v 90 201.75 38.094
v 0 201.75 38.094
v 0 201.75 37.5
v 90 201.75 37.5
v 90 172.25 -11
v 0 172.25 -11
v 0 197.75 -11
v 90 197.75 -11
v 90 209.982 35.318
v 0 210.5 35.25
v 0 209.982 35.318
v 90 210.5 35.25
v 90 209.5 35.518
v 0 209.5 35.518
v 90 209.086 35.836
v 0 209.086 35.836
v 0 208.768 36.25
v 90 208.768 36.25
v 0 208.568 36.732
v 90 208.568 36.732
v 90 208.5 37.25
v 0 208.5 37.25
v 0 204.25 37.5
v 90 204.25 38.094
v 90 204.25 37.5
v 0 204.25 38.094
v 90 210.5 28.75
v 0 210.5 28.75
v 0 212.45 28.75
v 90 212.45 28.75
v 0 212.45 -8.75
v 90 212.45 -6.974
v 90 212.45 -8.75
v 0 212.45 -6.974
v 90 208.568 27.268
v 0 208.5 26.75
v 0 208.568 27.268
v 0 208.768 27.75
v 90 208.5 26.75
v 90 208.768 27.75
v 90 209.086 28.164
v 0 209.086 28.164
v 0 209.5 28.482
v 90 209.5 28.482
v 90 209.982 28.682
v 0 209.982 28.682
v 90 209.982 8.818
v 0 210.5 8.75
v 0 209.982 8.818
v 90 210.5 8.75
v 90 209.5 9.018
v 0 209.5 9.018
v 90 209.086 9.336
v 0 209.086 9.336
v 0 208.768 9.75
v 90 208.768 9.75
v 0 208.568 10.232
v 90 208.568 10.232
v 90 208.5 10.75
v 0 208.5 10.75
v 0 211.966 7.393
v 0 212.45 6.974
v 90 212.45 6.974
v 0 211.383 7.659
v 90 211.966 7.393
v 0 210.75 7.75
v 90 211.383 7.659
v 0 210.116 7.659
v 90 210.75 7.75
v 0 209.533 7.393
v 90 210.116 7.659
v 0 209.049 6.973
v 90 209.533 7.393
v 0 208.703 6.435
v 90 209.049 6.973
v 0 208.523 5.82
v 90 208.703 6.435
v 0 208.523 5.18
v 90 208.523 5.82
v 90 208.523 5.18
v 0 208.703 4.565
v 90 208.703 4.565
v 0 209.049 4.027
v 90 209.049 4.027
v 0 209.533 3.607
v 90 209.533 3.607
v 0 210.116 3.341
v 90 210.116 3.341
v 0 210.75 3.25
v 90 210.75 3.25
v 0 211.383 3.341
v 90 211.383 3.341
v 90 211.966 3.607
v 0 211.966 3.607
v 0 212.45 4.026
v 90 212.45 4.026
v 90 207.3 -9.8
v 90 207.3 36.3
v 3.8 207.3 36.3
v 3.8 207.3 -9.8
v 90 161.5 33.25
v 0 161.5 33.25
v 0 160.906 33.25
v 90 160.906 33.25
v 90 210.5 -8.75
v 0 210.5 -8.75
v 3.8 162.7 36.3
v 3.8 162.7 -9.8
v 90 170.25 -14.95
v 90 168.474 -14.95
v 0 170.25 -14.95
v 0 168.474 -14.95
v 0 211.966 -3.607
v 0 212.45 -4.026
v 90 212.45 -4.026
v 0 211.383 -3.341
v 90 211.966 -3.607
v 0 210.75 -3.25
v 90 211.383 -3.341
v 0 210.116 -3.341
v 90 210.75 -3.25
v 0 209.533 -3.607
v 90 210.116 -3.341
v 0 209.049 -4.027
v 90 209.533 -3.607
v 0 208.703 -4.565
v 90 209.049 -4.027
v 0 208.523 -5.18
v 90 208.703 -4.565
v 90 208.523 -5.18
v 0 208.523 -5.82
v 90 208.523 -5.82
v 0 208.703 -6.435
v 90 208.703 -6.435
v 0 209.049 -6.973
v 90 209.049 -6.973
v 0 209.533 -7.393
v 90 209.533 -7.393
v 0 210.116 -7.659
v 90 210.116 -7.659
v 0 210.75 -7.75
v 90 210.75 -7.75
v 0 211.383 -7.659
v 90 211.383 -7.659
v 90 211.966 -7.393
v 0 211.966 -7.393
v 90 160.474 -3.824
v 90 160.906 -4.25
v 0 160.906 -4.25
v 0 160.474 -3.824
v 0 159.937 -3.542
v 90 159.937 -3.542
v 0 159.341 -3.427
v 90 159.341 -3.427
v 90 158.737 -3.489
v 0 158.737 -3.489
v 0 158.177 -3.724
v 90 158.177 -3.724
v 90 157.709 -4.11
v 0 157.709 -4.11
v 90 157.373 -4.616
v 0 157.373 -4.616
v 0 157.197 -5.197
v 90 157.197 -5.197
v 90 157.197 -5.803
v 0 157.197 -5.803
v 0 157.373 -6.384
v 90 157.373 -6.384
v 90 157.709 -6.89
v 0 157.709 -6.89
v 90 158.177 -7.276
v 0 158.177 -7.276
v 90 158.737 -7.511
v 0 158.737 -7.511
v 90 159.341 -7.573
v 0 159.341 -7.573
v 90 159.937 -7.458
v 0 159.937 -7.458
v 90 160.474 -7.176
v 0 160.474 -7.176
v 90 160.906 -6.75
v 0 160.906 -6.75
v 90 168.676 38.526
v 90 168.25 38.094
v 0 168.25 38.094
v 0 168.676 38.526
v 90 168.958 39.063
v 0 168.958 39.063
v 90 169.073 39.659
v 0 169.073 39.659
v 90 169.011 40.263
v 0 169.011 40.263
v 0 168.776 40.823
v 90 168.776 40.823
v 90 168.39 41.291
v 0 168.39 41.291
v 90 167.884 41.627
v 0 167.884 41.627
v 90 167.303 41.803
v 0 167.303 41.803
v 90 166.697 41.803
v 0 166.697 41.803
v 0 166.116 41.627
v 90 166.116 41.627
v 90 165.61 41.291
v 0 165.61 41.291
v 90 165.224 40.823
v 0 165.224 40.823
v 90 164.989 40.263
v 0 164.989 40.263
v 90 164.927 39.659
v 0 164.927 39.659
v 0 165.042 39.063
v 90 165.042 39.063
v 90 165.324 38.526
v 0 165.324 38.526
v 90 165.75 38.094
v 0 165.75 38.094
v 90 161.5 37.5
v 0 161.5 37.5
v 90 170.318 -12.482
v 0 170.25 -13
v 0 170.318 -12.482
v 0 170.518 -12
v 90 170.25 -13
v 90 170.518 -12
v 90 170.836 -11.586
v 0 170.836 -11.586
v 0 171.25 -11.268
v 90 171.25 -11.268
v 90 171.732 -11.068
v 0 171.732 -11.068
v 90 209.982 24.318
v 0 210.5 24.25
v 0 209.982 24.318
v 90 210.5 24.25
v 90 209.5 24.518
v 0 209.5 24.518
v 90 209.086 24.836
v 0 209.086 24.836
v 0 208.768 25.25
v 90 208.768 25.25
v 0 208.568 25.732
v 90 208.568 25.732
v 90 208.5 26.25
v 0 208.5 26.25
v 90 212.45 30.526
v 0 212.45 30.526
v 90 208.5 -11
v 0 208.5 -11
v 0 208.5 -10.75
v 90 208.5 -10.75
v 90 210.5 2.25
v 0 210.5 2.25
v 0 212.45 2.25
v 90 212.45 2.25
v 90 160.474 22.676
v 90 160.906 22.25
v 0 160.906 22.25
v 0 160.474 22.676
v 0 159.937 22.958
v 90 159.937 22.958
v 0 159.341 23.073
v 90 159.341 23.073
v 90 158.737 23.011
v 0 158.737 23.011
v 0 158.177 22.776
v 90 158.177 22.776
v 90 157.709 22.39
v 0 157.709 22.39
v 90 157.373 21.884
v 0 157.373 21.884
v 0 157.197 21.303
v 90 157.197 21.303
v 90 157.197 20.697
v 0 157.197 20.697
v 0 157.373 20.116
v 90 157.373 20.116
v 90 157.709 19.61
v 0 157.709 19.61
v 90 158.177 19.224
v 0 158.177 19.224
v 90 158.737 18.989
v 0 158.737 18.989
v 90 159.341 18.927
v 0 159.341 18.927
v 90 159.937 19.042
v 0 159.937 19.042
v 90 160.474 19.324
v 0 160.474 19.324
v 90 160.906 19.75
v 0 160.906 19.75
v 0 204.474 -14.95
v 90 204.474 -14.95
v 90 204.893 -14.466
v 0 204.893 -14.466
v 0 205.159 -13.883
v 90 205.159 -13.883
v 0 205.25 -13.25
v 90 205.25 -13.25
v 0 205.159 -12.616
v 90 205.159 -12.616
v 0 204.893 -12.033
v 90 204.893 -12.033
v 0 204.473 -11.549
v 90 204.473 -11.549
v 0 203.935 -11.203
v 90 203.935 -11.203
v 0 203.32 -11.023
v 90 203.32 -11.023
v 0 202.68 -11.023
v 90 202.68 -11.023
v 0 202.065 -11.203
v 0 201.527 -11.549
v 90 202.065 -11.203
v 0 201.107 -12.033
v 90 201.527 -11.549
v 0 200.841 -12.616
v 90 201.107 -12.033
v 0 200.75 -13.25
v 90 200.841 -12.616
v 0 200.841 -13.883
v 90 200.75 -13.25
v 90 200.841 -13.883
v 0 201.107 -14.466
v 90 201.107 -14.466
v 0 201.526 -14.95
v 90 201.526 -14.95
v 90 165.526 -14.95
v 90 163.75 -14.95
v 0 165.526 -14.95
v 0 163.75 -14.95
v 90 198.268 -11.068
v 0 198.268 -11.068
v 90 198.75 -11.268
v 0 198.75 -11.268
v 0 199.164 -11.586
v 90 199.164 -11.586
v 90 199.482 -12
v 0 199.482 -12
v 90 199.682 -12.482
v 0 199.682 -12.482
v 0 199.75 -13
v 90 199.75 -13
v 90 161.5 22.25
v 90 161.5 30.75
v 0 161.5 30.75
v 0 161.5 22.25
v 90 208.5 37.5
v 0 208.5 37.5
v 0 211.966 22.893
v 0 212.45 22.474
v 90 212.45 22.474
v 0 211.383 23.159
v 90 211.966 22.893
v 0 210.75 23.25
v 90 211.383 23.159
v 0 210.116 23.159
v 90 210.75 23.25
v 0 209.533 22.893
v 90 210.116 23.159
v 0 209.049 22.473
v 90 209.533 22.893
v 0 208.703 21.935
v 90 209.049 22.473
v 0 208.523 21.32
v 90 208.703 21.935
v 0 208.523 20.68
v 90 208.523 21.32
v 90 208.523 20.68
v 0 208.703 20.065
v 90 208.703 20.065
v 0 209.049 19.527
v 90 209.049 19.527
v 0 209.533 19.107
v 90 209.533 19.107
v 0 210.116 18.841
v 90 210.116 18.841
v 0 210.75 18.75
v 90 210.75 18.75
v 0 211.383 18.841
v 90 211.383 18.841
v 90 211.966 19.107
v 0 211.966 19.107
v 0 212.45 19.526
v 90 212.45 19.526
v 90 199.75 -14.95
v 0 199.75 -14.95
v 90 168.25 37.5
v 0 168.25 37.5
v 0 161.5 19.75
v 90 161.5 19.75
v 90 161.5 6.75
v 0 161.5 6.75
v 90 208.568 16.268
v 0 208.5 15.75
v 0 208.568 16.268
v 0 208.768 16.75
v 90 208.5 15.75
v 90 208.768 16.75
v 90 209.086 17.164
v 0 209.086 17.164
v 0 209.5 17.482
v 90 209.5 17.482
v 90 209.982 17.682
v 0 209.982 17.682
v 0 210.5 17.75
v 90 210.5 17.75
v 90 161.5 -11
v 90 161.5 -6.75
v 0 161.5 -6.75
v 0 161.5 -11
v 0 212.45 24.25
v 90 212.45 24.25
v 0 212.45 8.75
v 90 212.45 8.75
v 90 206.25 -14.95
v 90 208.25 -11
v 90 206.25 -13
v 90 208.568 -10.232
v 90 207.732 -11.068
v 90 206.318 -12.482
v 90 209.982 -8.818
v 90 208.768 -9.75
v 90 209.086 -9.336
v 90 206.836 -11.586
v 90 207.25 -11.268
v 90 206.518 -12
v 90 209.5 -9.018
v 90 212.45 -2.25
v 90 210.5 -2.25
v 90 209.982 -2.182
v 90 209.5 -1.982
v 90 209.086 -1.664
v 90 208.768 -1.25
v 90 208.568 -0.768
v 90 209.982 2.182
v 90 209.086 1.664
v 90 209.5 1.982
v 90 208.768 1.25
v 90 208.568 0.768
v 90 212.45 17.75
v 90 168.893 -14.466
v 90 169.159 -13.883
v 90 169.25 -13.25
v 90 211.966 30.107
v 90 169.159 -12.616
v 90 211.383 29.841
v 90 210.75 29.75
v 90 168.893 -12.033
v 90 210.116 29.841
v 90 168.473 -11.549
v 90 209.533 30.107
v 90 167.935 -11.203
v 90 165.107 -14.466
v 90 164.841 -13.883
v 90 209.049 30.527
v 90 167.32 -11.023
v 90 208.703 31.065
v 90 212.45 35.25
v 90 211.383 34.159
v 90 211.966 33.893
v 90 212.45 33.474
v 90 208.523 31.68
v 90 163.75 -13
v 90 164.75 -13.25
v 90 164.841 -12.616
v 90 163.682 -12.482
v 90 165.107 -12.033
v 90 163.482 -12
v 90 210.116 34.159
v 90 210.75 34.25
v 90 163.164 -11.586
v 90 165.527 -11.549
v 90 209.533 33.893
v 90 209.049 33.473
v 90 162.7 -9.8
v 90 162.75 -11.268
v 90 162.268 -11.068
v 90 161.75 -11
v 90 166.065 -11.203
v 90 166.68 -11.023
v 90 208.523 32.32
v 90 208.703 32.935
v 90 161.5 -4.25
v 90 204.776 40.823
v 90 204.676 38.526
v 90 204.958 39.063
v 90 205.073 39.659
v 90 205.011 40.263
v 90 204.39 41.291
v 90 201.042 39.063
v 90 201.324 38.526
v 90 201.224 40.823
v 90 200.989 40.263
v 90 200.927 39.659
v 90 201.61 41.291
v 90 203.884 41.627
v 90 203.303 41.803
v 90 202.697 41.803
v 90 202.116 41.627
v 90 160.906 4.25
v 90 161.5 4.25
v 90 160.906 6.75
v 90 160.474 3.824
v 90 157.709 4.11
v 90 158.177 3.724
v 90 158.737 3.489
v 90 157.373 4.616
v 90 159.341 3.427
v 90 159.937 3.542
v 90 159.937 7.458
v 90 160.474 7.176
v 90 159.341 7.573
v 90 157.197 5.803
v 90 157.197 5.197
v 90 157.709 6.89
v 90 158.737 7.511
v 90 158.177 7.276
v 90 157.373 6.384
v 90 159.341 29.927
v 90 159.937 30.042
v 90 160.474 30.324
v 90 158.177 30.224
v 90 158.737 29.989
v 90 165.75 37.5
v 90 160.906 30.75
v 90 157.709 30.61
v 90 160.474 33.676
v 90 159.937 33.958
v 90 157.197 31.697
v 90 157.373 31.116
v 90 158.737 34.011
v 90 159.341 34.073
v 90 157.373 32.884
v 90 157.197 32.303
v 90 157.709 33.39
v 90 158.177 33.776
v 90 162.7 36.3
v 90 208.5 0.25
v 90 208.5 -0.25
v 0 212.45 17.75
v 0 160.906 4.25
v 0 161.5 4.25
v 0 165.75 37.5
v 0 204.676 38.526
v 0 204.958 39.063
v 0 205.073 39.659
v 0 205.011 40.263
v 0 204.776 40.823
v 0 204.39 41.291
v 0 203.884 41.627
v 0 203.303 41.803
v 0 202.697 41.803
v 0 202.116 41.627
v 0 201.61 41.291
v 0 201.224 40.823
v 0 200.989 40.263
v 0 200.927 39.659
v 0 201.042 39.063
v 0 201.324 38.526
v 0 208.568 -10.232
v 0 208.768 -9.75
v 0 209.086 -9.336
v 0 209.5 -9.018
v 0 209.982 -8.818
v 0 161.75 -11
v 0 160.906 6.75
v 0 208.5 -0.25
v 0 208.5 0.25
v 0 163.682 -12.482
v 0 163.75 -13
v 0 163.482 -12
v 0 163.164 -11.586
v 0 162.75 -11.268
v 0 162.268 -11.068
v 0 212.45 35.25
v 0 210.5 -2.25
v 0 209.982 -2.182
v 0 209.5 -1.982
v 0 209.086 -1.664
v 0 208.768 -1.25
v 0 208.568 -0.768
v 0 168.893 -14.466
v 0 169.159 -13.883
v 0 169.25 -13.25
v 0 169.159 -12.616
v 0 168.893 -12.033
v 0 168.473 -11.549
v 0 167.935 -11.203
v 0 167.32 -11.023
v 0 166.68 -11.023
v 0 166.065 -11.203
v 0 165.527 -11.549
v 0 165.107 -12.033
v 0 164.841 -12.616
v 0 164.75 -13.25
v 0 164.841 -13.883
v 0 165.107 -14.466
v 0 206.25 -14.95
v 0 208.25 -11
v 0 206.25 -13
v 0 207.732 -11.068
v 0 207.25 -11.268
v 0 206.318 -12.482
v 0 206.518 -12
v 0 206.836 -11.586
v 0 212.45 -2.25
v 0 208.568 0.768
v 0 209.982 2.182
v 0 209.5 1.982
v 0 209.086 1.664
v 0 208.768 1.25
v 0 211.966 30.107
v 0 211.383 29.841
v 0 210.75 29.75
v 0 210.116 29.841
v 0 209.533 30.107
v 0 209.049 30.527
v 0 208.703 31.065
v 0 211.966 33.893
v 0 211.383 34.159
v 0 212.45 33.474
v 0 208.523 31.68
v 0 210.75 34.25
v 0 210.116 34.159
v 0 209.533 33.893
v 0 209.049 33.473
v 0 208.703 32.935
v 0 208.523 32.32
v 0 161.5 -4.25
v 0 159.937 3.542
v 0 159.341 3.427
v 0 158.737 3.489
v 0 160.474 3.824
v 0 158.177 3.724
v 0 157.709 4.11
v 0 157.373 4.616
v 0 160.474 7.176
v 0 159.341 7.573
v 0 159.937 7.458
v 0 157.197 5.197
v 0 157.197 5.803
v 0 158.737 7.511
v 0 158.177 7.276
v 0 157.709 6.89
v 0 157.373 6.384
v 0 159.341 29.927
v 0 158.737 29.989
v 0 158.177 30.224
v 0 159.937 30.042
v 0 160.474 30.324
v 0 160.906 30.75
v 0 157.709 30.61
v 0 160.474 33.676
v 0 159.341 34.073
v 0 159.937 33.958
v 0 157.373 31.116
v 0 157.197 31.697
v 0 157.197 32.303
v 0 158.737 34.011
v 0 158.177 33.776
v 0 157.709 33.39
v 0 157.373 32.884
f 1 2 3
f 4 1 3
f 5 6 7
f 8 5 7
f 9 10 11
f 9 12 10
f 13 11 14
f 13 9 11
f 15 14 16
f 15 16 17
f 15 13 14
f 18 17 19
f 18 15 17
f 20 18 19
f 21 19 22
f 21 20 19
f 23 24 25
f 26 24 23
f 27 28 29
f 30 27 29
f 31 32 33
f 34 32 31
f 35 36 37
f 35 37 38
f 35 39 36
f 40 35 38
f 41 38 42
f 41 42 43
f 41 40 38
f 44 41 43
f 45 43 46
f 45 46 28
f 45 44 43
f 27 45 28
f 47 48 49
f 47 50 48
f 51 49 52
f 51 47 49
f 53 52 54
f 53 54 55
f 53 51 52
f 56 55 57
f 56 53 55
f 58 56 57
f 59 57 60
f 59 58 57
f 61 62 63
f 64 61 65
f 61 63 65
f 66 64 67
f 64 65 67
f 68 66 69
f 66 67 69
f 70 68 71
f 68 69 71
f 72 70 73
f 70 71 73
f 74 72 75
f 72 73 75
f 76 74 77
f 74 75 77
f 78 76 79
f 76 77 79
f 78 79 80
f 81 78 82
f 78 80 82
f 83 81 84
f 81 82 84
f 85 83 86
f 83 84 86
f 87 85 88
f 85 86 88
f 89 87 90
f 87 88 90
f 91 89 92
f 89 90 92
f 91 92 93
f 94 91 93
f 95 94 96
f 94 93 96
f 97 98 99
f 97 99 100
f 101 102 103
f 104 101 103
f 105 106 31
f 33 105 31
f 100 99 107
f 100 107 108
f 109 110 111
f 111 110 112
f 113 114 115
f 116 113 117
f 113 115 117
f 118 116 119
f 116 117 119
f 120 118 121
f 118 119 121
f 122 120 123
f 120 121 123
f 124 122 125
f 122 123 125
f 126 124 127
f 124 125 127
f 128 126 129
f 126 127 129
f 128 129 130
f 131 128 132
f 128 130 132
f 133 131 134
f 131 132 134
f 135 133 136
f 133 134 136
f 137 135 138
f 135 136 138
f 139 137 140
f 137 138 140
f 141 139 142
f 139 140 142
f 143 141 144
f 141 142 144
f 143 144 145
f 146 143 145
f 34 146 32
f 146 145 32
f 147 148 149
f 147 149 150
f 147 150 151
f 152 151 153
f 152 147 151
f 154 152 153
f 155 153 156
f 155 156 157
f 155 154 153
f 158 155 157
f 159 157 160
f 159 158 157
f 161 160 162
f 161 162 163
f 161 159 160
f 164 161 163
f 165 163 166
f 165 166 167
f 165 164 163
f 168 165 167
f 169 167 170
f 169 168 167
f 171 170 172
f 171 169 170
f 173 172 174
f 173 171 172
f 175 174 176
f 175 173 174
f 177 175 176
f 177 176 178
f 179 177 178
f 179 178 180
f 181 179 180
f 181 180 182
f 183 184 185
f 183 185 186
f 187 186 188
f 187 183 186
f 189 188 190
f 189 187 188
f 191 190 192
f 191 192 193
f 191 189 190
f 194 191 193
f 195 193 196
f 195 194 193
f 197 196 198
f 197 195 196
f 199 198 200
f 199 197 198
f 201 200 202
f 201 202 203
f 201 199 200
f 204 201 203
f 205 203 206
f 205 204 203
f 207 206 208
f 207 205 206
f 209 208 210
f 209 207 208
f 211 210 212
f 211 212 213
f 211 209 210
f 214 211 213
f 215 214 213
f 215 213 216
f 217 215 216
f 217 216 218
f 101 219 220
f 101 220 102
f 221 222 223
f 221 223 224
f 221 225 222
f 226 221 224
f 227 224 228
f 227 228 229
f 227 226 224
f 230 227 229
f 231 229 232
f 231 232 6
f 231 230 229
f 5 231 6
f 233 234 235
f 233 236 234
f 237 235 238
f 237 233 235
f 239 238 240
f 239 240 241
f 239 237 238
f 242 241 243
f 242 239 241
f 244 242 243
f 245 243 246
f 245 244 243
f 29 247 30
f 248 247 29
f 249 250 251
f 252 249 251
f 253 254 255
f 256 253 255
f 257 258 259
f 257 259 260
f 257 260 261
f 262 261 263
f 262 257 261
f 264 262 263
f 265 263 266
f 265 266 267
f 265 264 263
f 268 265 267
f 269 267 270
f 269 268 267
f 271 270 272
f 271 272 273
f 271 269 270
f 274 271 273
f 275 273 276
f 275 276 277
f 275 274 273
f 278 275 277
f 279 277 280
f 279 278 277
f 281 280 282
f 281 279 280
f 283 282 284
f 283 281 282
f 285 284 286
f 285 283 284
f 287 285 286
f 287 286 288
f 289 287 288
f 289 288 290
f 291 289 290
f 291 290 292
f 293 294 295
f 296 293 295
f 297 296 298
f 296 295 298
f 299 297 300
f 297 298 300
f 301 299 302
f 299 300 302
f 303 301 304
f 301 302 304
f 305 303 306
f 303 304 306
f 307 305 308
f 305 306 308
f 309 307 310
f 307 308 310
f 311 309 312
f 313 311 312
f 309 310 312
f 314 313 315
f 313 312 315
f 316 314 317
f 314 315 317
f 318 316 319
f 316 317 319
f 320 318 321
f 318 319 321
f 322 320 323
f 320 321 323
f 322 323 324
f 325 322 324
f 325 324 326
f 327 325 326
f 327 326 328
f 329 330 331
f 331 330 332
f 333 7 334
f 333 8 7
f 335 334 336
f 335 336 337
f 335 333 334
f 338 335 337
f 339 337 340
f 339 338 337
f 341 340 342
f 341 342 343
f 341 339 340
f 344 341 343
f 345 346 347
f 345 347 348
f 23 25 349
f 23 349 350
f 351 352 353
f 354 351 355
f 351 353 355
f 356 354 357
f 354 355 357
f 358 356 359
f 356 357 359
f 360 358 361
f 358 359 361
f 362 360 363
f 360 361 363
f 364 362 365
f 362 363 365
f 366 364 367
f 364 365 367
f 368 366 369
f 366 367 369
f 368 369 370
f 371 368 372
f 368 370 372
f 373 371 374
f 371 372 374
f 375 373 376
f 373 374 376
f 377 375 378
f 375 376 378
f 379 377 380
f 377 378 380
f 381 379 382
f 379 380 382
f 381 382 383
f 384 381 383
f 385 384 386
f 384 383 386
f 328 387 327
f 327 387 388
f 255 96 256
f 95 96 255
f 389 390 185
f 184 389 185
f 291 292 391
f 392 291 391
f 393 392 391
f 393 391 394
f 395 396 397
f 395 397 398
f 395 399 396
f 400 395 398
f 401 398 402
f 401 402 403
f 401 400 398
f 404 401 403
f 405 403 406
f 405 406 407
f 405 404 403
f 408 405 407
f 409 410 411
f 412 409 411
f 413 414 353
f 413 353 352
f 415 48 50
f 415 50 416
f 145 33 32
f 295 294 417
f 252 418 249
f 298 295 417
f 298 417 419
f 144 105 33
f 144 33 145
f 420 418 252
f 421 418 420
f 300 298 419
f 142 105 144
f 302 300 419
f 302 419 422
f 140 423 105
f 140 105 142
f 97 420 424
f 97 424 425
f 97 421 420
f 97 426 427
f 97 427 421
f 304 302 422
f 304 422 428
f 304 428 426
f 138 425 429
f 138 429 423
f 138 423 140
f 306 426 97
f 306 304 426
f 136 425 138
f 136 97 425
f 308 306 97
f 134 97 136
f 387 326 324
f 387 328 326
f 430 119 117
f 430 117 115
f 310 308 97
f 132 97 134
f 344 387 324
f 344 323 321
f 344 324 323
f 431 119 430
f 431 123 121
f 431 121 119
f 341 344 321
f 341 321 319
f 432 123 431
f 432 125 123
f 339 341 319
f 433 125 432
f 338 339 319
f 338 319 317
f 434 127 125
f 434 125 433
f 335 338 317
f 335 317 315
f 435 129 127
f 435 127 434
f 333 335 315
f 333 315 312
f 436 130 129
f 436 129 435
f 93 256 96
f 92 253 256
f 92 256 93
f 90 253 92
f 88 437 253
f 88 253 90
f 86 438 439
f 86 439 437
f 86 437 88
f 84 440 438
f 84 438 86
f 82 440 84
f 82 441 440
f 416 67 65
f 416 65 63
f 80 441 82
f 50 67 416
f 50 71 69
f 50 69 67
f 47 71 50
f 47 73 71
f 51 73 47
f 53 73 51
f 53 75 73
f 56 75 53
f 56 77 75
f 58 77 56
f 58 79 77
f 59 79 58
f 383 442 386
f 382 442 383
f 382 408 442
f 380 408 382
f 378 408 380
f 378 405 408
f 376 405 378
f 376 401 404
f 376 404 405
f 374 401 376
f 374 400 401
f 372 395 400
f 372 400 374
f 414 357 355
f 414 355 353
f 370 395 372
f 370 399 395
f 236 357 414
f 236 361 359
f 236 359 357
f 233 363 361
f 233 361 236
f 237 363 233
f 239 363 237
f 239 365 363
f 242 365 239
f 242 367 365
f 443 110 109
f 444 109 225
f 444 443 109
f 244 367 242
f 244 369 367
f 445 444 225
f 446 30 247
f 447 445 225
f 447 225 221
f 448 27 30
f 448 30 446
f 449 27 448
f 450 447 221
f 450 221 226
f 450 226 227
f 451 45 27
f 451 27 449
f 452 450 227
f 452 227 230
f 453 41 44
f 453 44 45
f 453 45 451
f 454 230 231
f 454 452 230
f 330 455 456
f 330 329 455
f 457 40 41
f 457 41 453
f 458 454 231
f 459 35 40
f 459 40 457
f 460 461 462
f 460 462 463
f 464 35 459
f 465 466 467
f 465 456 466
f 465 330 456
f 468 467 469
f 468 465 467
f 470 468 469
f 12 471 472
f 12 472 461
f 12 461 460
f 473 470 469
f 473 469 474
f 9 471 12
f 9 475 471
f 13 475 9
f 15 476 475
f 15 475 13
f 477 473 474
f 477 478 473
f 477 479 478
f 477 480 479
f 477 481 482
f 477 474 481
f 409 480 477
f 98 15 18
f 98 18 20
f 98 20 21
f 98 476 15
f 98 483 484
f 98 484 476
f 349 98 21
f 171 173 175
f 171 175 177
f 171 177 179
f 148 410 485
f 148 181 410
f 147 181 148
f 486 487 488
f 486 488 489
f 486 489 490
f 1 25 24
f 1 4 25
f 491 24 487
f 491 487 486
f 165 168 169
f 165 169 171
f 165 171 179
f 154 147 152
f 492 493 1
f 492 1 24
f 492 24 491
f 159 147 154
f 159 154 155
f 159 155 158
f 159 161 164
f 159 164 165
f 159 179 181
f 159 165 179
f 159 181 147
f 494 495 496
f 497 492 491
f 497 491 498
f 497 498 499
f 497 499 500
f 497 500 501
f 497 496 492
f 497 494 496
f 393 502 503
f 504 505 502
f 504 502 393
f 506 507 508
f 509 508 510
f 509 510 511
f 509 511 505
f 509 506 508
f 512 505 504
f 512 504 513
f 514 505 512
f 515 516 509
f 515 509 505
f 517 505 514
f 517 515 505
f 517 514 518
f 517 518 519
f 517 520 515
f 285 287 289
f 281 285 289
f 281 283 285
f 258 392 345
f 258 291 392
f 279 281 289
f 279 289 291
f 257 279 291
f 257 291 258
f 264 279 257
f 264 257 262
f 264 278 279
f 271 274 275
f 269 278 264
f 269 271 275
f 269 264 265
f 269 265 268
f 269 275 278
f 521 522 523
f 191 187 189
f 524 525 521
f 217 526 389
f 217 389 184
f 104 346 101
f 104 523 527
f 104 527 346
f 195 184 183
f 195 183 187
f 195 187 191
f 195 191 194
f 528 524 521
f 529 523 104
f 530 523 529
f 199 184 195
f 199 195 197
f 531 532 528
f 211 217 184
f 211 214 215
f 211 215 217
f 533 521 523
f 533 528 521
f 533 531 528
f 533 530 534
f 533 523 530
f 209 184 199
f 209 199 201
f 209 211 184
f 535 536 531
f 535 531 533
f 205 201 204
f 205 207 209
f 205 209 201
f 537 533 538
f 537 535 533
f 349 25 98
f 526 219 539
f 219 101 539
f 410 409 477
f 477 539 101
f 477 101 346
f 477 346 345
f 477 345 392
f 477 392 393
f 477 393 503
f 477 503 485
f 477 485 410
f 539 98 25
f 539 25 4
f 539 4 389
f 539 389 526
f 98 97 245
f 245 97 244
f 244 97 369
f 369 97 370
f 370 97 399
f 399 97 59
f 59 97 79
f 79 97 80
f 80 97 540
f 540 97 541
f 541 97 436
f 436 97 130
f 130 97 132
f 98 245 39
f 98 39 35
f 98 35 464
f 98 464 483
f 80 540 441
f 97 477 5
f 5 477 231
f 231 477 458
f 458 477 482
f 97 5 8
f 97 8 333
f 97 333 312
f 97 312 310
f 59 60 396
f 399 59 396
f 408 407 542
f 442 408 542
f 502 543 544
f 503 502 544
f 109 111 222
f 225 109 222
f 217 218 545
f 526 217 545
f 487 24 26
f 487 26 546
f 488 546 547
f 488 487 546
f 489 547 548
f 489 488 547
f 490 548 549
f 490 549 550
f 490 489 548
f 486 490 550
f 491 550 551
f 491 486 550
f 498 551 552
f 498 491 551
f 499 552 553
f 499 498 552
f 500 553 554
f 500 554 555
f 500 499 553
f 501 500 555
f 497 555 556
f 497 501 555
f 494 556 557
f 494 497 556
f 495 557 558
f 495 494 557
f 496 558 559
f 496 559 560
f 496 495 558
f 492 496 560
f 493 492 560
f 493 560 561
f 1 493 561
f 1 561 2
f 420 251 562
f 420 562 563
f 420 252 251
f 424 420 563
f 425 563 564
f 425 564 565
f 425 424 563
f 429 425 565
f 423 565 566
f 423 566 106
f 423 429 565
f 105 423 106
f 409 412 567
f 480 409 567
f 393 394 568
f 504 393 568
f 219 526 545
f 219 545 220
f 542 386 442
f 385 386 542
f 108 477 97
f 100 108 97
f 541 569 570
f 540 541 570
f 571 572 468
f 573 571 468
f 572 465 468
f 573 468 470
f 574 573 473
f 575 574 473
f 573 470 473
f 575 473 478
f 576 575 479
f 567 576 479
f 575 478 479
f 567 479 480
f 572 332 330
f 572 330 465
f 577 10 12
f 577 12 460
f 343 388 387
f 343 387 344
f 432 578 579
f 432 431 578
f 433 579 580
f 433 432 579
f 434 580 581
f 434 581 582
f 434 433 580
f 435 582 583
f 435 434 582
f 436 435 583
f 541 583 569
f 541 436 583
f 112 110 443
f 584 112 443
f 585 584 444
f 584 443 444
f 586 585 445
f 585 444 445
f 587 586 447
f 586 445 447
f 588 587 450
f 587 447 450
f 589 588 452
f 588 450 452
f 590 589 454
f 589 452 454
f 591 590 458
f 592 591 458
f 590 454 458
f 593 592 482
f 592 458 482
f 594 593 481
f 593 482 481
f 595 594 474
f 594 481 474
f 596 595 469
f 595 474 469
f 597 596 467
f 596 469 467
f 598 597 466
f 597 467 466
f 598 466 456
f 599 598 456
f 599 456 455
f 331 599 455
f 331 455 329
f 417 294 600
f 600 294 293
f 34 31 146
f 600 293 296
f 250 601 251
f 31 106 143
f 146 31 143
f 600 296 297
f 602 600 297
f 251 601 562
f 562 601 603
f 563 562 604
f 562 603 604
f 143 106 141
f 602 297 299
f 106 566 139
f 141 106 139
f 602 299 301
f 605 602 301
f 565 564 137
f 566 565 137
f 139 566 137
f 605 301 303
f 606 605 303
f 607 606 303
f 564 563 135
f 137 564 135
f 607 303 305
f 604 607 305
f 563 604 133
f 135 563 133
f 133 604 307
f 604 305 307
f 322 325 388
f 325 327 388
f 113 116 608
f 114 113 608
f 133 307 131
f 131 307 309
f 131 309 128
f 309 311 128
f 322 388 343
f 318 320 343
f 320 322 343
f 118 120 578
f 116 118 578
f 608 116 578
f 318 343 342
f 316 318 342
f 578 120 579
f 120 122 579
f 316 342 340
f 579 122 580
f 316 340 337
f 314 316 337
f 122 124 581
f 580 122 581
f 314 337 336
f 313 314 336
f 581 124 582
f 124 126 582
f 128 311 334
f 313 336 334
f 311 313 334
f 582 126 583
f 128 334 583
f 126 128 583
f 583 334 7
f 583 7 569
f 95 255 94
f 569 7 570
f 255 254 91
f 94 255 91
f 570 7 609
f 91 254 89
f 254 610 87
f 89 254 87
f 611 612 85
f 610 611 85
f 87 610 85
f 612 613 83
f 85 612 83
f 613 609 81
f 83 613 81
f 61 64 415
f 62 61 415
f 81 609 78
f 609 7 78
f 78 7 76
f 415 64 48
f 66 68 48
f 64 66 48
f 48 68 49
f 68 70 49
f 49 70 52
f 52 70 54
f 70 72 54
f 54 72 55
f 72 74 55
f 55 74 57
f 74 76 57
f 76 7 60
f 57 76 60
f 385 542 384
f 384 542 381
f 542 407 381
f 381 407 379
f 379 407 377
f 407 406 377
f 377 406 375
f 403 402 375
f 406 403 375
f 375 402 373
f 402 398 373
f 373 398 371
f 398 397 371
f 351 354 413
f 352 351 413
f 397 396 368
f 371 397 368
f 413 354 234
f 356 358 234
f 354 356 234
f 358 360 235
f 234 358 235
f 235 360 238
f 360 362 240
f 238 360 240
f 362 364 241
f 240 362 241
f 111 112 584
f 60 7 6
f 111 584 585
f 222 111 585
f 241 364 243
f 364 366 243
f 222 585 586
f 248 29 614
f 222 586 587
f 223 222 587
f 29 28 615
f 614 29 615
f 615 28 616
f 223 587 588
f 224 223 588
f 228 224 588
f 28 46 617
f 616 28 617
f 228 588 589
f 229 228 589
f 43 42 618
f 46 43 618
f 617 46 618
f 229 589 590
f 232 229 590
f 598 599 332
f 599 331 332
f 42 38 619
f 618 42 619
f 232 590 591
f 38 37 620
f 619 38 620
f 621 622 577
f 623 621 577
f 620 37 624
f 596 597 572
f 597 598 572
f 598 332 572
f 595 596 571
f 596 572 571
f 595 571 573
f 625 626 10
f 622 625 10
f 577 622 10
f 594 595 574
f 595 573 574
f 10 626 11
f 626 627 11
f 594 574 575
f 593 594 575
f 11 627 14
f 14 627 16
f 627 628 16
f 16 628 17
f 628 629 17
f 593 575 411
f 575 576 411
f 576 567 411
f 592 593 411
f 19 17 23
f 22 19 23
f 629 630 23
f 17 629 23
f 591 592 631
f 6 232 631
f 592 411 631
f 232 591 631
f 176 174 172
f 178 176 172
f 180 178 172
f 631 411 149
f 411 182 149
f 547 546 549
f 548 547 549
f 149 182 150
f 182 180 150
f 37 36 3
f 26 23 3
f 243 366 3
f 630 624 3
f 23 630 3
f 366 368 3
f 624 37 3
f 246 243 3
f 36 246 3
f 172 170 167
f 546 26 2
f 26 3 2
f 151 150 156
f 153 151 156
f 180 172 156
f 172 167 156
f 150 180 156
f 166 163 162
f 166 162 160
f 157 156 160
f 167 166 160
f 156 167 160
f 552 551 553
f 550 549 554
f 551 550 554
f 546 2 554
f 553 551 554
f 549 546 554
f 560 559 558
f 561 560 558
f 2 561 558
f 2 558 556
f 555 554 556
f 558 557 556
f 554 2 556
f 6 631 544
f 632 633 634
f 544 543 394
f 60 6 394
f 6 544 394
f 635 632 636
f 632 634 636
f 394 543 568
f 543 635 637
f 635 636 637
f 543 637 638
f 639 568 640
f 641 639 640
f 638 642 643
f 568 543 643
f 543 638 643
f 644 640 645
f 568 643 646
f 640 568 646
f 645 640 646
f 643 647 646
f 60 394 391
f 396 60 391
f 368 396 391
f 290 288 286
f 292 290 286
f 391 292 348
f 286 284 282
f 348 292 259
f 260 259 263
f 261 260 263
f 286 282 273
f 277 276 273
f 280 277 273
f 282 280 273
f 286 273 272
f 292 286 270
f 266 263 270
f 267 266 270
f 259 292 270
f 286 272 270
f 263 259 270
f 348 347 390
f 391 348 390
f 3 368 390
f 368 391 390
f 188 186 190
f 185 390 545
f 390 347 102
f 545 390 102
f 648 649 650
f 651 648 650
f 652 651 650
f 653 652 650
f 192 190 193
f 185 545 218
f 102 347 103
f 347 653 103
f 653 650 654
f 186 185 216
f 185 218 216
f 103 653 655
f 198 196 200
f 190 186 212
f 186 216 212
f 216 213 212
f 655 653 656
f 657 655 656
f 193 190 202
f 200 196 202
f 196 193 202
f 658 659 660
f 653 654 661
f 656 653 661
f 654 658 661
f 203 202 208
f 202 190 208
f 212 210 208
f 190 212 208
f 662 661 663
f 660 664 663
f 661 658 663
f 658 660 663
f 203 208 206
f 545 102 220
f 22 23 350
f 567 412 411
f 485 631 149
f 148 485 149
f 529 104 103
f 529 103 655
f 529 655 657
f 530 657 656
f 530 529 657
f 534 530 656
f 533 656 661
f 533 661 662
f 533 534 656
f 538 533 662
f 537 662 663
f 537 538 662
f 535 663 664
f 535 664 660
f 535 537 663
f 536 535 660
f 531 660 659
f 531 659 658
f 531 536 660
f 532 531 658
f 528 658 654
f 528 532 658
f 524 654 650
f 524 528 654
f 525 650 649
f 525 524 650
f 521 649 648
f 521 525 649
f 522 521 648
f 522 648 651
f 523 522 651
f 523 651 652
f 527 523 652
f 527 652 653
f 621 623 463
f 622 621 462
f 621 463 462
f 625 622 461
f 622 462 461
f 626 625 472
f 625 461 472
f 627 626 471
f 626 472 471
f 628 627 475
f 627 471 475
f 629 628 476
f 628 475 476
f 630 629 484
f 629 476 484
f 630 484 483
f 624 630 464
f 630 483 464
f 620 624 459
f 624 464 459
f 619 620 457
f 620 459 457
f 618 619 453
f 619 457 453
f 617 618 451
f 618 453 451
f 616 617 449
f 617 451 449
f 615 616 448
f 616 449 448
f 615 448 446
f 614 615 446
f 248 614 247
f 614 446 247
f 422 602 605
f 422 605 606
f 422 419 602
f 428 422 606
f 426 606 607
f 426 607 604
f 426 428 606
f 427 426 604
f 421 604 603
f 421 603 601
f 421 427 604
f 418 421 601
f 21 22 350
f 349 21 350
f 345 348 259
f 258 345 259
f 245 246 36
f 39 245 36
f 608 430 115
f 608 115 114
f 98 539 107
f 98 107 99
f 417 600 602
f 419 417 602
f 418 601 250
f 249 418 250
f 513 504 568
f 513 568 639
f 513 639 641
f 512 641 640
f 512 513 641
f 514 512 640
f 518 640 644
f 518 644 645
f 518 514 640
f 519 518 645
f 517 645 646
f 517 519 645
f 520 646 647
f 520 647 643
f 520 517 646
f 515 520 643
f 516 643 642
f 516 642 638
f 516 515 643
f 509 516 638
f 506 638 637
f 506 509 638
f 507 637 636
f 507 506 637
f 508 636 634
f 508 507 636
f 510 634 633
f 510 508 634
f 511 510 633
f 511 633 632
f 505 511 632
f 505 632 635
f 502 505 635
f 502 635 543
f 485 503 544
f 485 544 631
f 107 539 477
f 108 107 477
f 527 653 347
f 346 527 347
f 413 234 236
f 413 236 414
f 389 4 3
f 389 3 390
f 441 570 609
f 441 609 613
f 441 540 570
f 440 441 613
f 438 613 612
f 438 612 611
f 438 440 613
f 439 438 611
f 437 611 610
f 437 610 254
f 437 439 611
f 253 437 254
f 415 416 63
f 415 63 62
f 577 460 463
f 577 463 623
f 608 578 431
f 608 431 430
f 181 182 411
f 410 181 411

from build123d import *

# Parameters (mm, degrees)
EXTRUDE_1_DEPTH             = 90
SKETCH_2_W                  = 90
SKETCH_2_H                  = 42.75
EXTRUDE_2_DEPTH             = 8.2
SKETCH_3_W                  = 90
SKETCH_3_H                  = 52.45
EXTRUDE_3_DEPTH             = 8.2
SKETCH_4_W                  = 3.95
SKETCH_4_H                  = 2.25
CUT_EXTRUDE_1_DEPTH         = 91
SKETCH_5_W                  = 3.95
SKETCH_5_H                  = 29.5
CUT_EXTRUDE_2_DEPTH         = 91
SKETCH_6_W                  = 3.95
SKETCH_6_H                  = 6.2
CUT_EXTRUDE_3_DEPTH         = 91
SKETCH_7_W                  = 2.25
SKETCH_7_H                  = 3.95
CUT_EXTRUDE_4_DEPTH         = 91
SKETCH_8_W                  = 4.5
SKETCH_8_H                  = 3.95
CUT_EXTRUDE_5_DEPTH         = 91
SKETCH_9_W                  = 9
SKETCH_9_H                  = 3.95
CUT_EXTRUDE_6_DEPTH         = 91
SKETCH_10_W                 = 4.5
SKETCH_10_H                 = 3.95
CUT_EXTRUDE_7_DEPTH         = 91
SKETCH_11_W                 = 2.25
SKETCH_11_H                 = 3.95
CUT_EXTRUDE_8_DEPTH         = 91
SKETCH_12_W                 = 46.1
SKETCH_12_H                 = 44.6
CUT_EXTRUDE_9_DEPTH         = 86.2
HOLE_WIZARD_2_5_2_5_1_D     = 2.5
HOLE_WIZARD_2_5_2_5_1_DEPTH = 90
HOLE_WIZARD_4_5_4_5_1_D     = 4.5
HOLE_WIZARD_4_5_4_5_1_DEPTH = 90
SKETCH_19_R                 = 1.67252853
SKETCH_19_R_2               = 1.459159852
SKETCH_19_R_3               = 1.459908976
SKETCH_19_R_4               = 1.592821911
SKETCH_19_R_5               = 1.532216665
SKETCH_19_R_6               = 1.596138091
EXTRUDE_4_DEPTH             = 90
FILLET_1_R                  = 2
FILLET_2_R                  = 2
FILLET_3_R                  = 2
FILLET_4_R                  = 2
FILLET_5_R                  = 2
FILLET_6_R                  = 2
FILLET_7_R                  = 2
FILLET_8_R                  = 2
FILLET_9_R                  = 2
FILLET_10_R                 = 2
FILLET_11_R                 = 2
FILLET_12_R                 = 2


with BuildPart() as part:
    # Эскиз1 → Бобышка-Вытянуть1 (new body)
    with BuildSketch(Plane(origin=(90, 0, 0), x_dir=(0, 0, -1), z_dir=(1, 0, 0))):
        with BuildLine():
            Line((6.75, 160.906238208), (6.75, 204.25))
            Line((6.75, 204.25), (-38.093761792, 204.25))
            ThreePointArc((-38.093761792, 204.25), (-41.825, 203), (-38.093761792, 201.75))
            Line((-38.093761792, 201.75), (-37.5, 201.75))
            Line((-37.5, 201.75), (-37.5, 168.25))
            Line((-37.5, 168.25), (-38.093761792, 168.25))
            ThreePointArc((-38.093761792, 168.25), (-41.825, 167), (-38.093761792, 165.75))
            Line((-38.093761792, 165.75), (-37.5, 165.75))
            Line((-37.5, 165.75), (-37.5, 161.5))
            Line((-37.5, 161.5), (-33.25, 161.5))
            Line((-33.25, 161.5), (-33.25, 160.906238208))
            ThreePointArc((-33.25, 160.906238208), (-32, 157.175), (-30.75, 160.906238208))
            Line((-30.75, 160.906238208), (-30.75, 161.5))
            Line((-30.75, 161.5), (-22.25, 161.5))
            Line((-22.25, 161.5), (-22.25, 160.906238208))
            ThreePointArc((-22.25, 160.906238208), (-21, 157.175), (-19.75, 160.906238208))
            Line((-19.75, 160.906238208), (-19.75, 161.5))
            Line((-19.75, 161.5), (-6.75, 161.5))
            Line((-6.75, 161.5), (-6.75, 160.906238208))
            ThreePointArc((-6.75, 160.906238208), (-5.5, 157.175), (-4.25, 160.906238208))
            Line((-4.25, 160.906238208), (-4.25, 161.5))
            Line((-4.25, 161.5), (4.25, 161.5))
            Line((4.25, 161.5), (4.25, 160.906238208))
            ThreePointArc((4.25, 160.906238208), (5.5, 157.175), (6.75, 160.906238208))
        make_face()
    extrude(amount=-EXTRUDE_1_DEPTH)

    # Эскиз2 → Бобышка-Вытянуть2 (add)
    with BuildSketch(Plane(origin=(0, 0, -6.75), x_dir=(-1, 0, 0), z_dir=(0, 0, -1))):
        with Locations((-45, 182.875)):
            Rectangle(SKETCH_2_W, SKETCH_2_H)
    extrude(amount=EXTRUDE_2_DEPTH)

    # Эскиз3 → Бобышка-Вытянуть3 (add)
    with BuildSketch(Plane(origin=(0, 204.25, 0), x_dir=(-1, 0, 0), z_dir=(0, 1, 0))):
        with Locations((-45, 11.275)):
            Rectangle(SKETCH_3_W, SKETCH_3_H)
    extrude(amount=EXTRUDE_3_DEPTH)

    # Эскиз4 → Вырез-Вытянуть1 (cut, through all)
    with BuildSketch(Plane.ZY):
        with Locations((-12.975, 162.625)):
            Rectangle(SKETCH_4_W, SKETCH_4_H)
    extrude(amount=-CUT_EXTRUDE_1_DEPTH, mode=Mode.SUBTRACT)

    # Эскиз5 → Вырез-Вытянуть2 (cut, through all)
    with BuildSketch(Plane.ZY):
        with Locations((-12.975, 185)):
            Rectangle(SKETCH_5_W, SKETCH_5_H)
    extrude(amount=-CUT_EXTRUDE_2_DEPTH, mode=Mode.SUBTRACT)

    # Эскиз6 → Вырез-Вытянуть3 (cut, through all)
    with BuildSketch(Plane.ZY):
        with Locations((-12.975, 209.35)):
            Rectangle(SKETCH_6_W, SKETCH_6_H)
    extrude(amount=-CUT_EXTRUDE_3_DEPTH, mode=Mode.SUBTRACT)

    # Эскиз7 → Вырез-Вытянуть4 (cut, through all)
    with BuildSketch(Plane.ZY):
        with Locations((-9.875, 210.475)):
            Rectangle(SKETCH_7_W, SKETCH_7_H)
    extrude(amount=-CUT_EXTRUDE_4_DEPTH, mode=Mode.SUBTRACT)

    # Эскиз8 → Вырез-Вытянуть5 (cut, through all)
    with BuildSketch(Plane.ZY):
        with Locations((0, 210.475)):
            Rectangle(SKETCH_8_W, SKETCH_8_H)
    extrude(amount=-CUT_EXTRUDE_5_DEPTH, mode=Mode.SUBTRACT)

    # Эскиз9 → Вырез-Вытянуть6 (cut, through all)
    with BuildSketch(Plane.ZY):
        with Locations((13.25, 210.475)):
            Rectangle(SKETCH_9_W, SKETCH_9_H)
    extrude(amount=-CUT_EXTRUDE_6_DEPTH, mode=Mode.SUBTRACT)

    # Эскиз10 → Вырез-Вытянуть7 (cut, through all)
    with BuildSketch(Plane.ZY):
        with Locations((26.5, 210.475)):
            Rectangle(SKETCH_10_W, SKETCH_10_H)
    extrude(amount=-CUT_EXTRUDE_7_DEPTH, mode=Mode.SUBTRACT)

    # Эскиз11 → Вырез-Вытянуть8 (cut, through all)
    with BuildSketch(Plane.ZY):
        with Locations((36.375, 210.475)):
            Rectangle(SKETCH_11_W, SKETCH_11_H)
    extrude(amount=-CUT_EXTRUDE_8_DEPTH, mode=Mode.SUBTRACT)

    # Эскиз12 → Вырез-Вытянуть9 (cut)
    with BuildSketch(Plane(origin=(90, 0, 0), x_dir=(0, 0, -1), z_dir=(1, 0, 0))):
        with Locations((-13.25, 185)):
            Rectangle(SKETCH_12_W, SKETCH_12_H)
    extrude(amount=-CUT_EXTRUDE_9_DEPTH, mode=Mode.SUBTRACT)

    # Диаметр отверстия Ø2.5 (2.5)1
    with Locations(Plane(origin=(90, 0, 0), x_dir=(0, 0, -1), z_dir=(1, 0, 0))):
        with Locations((5.5, 159.25), (-21, 159.25), (-5.5, 159.25), (-32, 159.25), (-39.75, 167), (-39.75, 203)):
            Hole(HOLE_WIZARD_2_5_2_5_1_D / 2, depth=HOLE_WIZARD_2_5_2_5_1_DEPTH)

    # Диаметр отверстия Ø4.5 (4.5)1
    with Locations(Plane.ZY):
        with Locations((-13.25, 167), (-13.25, 203), (-5.5, 210.75), (5.5, 210.75), (21, 210.75), (32, 210.75)):
            Hole(HOLE_WIZARD_4_5_4_5_1_D / 2, depth=HOLE_WIZARD_4_5_4_5_1_DEPTH)

    # Эскиз19 → Бобышка-Вытянуть4 (add)
    with BuildSketch(Plane(origin=(90, 0, 0), x_dir=(0, 0, -1), z_dir=(1, 0, 0))):
        with Locations((-39.75, 203)):
            Circle(SKETCH_19_R)
        with Locations((-39.75, 167)):
            Circle(SKETCH_19_R_2)
        with Locations((-32, 159.25)):
            Circle(SKETCH_19_R_3)
        with Locations((-21, 159.25)):
            Circle(SKETCH_19_R_4)
        with Locations((-5.5, 159.25)):
            Circle(SKETCH_19_R_5)
        with Locations((5.5, 159.25)):
            Circle(SKETCH_19_R_6)
    extrude(amount=-EXTRUDE_4_DEPTH)

    # Скругление1
    fillet_1_edges = [part.edges().sort_by_distance(p)[0] for p in [
        (45, 208.5, -8.75),
    ]]
    fillet(fillet_1_edges, radius=FILLET_1_R)

    # Скругление2
    fillet_2_edges = [part.edges().sort_by_distance(p)[0] for p in [
        (45, 163.75, -11),
    ]]
    fillet(fillet_2_edges, radius=FILLET_2_R)

    # Скругление3
    fillet_3_edges = [part.edges().sort_by_distance(p)[0] for p in [
        (45, 170.25, -11),
    ]]
    fillet(fillet_3_edges, radius=FILLET_3_R)

    # Скругление4
    fillet_4_edges = [part.edges().sort_by_distance(p)[0] for p in [
        (45, 199.75, -11),
    ]]
    fillet(fillet_4_edges, radius=FILLET_4_R)

    # Скругление5
    fillet_5_edges = [part.edges().sort_by_distance(p)[0] for p in [
        (45, 206.25, -11),
    ]]
    fillet(fillet_5_edges, radius=FILLET_5_R)

    # Скругление6
    fillet_6_edges = [part.edges().sort_by_distance(p)[0] for p in [
        (45, 208.5, -2.25),
    ]]
    fillet(fillet_6_edges, radius=FILLET_6_R)

    # Скругление7
    fillet_7_edges = [part.edges().sort_by_distance(p)[0] for p in [
        (45, 208.5, 2.25),
    ]]
    fillet(fillet_7_edges, radius=FILLET_7_R)

    # Скругление8
    fillet_8_edges = [part.edges().sort_by_distance(p)[0] for p in [
        (45, 208.5, 8.75),
    ]]
    fillet(fillet_8_edges, radius=FILLET_8_R)

    # Скругление9
    fillet_9_edges = [part.edges().sort_by_distance(p)[0] for p in [
        (45, 208.5, 17.75),
    ]]
    fillet(fillet_9_edges, radius=FILLET_9_R)

    # Скругление10
    fillet_10_edges = [part.edges().sort_by_distance(p)[0] for p in [
        (45, 208.5, 24.25),
    ]]
    fillet(fillet_10_edges, radius=FILLET_10_R)

    # Скругление11
    fillet_11_edges = [part.edges().sort_by_distance(p)[0] for p in [
        (45, 208.5, 28.75),
    ]]
    fillet(fillet_11_edges, radius=FILLET_11_R)

    # Скругление12
    fillet_12_edges = [part.edges().sort_by_distance(p)[0] for p in [
        (45, 208.5, 35.25),
    ]]
    fillet(fillet_12_edges, radius=FILLET_12_R)


solid = part.part
